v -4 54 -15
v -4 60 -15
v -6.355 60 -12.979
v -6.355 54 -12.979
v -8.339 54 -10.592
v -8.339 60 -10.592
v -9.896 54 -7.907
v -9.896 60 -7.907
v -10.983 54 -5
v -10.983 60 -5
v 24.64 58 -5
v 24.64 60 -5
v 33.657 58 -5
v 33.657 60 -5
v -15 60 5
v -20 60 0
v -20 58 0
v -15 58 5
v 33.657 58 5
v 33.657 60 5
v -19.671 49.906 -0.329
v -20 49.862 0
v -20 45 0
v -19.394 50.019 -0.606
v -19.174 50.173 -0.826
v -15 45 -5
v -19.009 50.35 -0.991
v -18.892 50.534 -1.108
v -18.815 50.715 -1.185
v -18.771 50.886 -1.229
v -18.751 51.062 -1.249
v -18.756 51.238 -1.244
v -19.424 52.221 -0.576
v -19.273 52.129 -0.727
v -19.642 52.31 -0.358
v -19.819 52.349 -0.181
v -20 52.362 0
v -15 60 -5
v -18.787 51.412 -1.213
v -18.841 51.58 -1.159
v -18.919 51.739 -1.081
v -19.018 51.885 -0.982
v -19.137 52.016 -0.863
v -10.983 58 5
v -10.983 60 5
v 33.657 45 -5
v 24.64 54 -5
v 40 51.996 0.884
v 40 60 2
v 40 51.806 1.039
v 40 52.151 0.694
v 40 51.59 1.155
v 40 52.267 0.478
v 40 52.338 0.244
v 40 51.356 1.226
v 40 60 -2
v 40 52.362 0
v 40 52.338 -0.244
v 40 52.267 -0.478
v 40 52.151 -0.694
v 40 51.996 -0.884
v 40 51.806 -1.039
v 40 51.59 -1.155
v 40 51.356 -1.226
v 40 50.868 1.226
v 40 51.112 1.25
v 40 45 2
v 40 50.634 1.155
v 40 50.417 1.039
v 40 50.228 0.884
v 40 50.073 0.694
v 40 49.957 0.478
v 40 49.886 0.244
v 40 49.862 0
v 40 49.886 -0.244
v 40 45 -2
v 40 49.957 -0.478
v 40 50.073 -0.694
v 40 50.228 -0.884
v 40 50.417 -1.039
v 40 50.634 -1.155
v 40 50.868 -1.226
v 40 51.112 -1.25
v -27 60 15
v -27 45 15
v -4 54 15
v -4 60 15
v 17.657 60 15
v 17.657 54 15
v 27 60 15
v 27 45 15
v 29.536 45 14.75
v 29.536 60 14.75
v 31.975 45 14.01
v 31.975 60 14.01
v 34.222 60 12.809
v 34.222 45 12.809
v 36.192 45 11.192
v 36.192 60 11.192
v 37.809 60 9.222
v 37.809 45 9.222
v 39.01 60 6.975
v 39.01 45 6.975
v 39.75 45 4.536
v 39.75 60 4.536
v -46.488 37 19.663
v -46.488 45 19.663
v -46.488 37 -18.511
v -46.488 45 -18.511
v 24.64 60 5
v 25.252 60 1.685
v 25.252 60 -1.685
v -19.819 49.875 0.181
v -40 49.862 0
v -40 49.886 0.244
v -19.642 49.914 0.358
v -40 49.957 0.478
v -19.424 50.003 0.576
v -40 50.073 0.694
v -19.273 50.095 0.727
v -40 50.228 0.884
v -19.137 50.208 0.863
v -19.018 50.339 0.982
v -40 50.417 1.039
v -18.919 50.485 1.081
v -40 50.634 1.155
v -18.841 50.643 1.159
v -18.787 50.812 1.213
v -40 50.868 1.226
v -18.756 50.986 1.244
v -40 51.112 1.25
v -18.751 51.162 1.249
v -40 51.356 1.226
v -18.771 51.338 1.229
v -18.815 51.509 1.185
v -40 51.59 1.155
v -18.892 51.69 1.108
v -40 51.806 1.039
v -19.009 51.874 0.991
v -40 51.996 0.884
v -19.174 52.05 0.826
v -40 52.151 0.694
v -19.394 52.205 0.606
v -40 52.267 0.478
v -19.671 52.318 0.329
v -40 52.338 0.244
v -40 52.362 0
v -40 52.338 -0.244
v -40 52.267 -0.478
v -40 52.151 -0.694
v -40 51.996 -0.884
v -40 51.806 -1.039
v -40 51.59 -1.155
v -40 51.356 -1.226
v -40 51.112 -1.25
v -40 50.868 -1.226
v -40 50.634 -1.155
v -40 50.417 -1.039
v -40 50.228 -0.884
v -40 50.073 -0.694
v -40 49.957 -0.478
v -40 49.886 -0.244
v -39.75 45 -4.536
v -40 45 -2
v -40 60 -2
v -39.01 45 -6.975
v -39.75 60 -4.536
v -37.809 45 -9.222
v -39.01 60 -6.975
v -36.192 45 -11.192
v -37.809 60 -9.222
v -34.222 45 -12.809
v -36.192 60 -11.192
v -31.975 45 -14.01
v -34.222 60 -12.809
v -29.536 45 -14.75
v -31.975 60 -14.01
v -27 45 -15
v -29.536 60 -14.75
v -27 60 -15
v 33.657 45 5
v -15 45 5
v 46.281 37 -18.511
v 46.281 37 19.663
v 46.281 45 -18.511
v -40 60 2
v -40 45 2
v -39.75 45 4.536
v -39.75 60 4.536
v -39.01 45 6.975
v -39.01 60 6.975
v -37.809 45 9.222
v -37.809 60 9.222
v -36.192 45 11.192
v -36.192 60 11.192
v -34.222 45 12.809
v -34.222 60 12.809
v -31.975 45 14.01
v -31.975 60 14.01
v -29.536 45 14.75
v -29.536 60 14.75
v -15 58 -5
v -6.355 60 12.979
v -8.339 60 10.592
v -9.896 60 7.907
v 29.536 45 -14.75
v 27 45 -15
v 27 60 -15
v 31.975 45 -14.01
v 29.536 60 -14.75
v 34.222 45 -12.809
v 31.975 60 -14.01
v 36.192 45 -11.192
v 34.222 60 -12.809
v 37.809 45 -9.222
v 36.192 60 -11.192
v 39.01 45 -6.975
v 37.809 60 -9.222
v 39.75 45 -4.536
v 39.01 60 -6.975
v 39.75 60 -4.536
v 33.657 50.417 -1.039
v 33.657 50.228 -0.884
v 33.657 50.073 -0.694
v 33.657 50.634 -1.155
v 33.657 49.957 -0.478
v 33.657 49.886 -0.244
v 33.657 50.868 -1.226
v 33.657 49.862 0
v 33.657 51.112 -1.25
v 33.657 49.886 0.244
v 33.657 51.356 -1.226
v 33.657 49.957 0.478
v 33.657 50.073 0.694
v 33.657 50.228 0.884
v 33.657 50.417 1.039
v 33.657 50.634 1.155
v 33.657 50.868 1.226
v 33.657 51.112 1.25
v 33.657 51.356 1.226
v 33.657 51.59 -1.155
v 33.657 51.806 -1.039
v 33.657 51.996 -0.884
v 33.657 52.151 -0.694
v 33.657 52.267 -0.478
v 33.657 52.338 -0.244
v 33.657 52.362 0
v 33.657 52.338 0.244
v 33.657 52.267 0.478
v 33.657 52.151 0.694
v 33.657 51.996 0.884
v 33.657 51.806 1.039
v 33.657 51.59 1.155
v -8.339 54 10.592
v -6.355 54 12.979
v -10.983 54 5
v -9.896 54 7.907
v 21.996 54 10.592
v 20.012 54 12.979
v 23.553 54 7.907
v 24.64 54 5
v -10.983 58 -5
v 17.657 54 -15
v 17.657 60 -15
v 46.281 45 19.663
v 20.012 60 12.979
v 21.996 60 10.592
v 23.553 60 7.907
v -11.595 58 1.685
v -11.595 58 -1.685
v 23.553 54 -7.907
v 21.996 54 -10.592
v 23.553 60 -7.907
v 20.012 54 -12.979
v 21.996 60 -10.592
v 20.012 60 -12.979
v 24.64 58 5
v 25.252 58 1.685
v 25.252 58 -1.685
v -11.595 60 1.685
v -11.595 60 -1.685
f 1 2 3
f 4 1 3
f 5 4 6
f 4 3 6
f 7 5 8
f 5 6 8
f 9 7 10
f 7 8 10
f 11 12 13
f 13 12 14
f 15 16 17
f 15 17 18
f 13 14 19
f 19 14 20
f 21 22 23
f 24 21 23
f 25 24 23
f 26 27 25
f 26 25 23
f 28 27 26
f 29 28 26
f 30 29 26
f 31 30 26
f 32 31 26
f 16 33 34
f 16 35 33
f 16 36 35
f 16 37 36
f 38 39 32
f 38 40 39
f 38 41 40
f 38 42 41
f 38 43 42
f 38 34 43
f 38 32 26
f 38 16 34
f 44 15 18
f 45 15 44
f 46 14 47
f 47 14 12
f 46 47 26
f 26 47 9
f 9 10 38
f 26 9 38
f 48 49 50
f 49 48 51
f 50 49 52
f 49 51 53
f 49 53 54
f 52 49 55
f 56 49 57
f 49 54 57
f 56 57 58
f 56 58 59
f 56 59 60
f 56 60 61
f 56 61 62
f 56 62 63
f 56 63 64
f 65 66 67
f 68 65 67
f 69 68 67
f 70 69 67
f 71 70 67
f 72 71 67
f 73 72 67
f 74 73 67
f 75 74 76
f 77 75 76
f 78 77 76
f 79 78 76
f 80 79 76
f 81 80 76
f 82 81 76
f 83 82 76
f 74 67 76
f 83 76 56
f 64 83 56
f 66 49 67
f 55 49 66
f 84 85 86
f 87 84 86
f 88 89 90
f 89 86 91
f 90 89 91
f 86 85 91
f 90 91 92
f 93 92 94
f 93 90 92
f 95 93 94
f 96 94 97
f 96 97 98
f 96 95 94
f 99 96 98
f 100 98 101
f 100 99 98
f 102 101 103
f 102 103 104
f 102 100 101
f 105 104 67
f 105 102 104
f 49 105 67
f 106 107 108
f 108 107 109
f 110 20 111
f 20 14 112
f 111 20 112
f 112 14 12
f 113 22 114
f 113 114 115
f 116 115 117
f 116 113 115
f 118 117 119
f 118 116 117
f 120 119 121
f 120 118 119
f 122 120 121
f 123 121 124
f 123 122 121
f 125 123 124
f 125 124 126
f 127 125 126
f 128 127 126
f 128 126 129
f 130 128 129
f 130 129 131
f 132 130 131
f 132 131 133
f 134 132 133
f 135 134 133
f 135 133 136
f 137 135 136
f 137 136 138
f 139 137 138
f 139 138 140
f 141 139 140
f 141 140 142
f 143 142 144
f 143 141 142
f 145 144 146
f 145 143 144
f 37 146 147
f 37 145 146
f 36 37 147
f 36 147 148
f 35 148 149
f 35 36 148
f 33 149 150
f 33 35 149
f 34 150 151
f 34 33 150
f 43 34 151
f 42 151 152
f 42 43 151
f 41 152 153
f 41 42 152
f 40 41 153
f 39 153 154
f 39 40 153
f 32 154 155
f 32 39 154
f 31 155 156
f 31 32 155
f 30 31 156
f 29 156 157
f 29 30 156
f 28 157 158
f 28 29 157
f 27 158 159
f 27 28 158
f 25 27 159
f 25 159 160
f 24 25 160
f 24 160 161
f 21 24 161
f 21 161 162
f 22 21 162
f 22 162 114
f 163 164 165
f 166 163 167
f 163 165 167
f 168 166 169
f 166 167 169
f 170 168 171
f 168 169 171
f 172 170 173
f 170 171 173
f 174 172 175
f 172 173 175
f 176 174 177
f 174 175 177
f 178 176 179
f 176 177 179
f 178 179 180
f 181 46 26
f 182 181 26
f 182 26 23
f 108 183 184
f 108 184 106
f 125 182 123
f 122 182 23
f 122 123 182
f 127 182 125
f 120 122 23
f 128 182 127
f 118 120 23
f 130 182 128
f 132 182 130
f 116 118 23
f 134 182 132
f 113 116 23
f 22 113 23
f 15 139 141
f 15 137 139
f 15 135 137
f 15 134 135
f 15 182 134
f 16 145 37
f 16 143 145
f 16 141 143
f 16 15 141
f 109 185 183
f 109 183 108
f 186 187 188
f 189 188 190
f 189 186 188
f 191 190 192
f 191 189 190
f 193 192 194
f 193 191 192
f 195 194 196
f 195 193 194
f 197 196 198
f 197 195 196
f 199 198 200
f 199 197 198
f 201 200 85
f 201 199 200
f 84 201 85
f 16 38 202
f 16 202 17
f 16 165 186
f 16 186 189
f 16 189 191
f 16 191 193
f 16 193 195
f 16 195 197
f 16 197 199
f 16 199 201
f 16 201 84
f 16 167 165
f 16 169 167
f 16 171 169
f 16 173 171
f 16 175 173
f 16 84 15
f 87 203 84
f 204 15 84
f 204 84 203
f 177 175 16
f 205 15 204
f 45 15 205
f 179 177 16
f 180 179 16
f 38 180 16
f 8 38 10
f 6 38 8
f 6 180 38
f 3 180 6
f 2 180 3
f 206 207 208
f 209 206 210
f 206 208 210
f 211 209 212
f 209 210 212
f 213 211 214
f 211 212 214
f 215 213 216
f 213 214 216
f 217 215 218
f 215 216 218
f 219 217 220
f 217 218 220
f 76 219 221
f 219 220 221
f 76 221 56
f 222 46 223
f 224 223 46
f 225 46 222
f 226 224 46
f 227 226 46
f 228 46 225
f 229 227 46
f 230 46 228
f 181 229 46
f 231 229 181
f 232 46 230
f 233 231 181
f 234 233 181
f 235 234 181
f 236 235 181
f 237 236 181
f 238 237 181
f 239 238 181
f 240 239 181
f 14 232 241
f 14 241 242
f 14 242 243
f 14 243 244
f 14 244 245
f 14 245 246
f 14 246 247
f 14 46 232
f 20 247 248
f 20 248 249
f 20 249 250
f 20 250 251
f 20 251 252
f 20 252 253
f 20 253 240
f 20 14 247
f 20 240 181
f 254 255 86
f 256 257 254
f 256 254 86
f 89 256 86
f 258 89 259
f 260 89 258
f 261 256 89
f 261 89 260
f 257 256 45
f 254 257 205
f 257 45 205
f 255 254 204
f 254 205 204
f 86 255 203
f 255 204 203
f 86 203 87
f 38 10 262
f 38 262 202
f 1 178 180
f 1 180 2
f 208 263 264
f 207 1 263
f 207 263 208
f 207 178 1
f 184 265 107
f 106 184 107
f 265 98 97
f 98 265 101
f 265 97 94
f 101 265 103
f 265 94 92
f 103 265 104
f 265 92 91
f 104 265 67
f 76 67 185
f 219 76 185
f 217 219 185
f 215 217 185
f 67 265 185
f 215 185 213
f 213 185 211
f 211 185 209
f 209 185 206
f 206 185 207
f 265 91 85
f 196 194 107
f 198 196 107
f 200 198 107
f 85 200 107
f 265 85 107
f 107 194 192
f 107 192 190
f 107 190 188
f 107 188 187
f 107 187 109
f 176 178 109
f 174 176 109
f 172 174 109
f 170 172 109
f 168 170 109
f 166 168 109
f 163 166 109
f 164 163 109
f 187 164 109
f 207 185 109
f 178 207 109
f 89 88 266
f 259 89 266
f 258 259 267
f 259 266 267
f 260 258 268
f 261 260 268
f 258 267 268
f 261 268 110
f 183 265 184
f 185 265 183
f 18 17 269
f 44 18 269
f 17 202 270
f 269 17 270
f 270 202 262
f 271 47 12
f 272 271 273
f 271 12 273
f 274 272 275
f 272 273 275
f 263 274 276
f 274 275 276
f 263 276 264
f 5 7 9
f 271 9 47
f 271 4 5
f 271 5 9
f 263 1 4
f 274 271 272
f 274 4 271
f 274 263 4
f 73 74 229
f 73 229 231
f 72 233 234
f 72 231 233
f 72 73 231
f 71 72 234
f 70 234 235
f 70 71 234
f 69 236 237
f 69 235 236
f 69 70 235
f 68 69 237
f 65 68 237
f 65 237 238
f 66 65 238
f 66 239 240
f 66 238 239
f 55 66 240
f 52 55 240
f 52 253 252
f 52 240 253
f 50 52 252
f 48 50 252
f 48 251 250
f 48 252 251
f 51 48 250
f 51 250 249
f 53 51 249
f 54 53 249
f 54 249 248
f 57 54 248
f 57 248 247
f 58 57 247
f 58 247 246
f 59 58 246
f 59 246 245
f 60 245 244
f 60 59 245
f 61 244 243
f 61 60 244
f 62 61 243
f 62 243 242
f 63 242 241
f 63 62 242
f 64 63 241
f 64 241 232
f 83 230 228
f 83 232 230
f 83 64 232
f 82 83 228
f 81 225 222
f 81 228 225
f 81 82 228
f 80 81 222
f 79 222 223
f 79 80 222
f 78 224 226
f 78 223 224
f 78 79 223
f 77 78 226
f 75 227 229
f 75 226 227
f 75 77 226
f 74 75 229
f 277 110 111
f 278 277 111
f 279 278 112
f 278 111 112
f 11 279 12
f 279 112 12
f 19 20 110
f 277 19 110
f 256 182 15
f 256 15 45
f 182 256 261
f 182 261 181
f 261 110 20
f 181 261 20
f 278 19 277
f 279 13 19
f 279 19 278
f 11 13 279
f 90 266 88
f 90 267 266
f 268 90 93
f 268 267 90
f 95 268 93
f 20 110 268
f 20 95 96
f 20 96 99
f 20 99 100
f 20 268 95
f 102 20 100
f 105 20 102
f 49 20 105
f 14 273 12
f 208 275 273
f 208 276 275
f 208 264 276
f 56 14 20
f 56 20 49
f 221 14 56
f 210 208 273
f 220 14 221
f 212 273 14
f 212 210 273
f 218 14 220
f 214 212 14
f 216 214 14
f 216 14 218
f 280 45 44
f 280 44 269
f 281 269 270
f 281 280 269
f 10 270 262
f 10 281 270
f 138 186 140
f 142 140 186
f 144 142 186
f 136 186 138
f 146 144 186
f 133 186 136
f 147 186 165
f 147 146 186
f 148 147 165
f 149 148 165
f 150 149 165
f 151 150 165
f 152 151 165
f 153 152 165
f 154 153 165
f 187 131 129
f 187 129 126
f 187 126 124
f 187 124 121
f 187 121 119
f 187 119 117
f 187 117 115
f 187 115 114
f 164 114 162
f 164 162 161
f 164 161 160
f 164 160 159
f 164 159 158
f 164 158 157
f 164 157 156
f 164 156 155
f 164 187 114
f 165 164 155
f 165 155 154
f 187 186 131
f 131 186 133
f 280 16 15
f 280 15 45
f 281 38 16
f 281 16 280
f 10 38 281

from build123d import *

# Parameters (mm, degrees)
SKETCH1_W                = 80
SKETCH1_H                = 30
BOSS_EXTRUDE1_DEPTH      = 60
CUT_EXTRUDE1_DEPTH       = 75
CUT_EXTRUDE2_DEPTH       = 102.118742081
CUT_EXTRUDE2_DEPTH_BACK  = 102.118742081
SKETCH3_R                = 1.25
FILLET1_R                = 13
SKETCH15_W               = 83.696095513
SKETCH15_H               = 31.69844841
CUT_EXTRUDE7_DEPTH       = 50
BOSS_EXTRUDE4_DEPTH      = 3
BOSS_EXTRUDE4_DEPTH_BACK = 5
SKETCH16_W               = 92.769089126
SKETCH16_H               = 38.173794917
SKETCH18_R               = 18.5
CUT_EXTRUDE8_DEPTH       = 6
BOSS_EXTRUDE5_DEPTH      = 2
BOSS_EXTRUDE5_2_DEPTH    = 2


with BuildPart() as part:
    # Sketch1 → Boss-Extrude1 (new body)
    with BuildSketch(Plane(origin=(0, 0, 0), x_dir=(1, 0, 0), z_dir=(0, 1, 0))):
        Rectangle(SKETCH1_W, SKETCH1_H)
    extrude(amount=BOSS_EXTRUDE1_DEPTH)

    # Sketch2 → Cut-Extrude1 (cut)
    with BuildSketch(Plane(origin=(0, 60, 0), x_dir=(1, 0, 0), z_dir=(0, 1, 0))):
        Polygon((-15, 5), (15, 5), (33.657016573, 5), (33.657016573, -5), (15, -5), (-15, -5), (-20, 0), align=None)
    extrude(amount=-CUT_EXTRUDE1_DEPTH, mode=Mode.SUBTRACT)

    # Sketch3 → Cut-Extrude2 (cut, two sides: drawn at the far end of the back side and taken through both)
    with BuildSketch(Plane.ZY.offset(40).offset(-CUT_EXTRUDE2_DEPTH_BACK)):
        with Locations(Location((0, 51.111959895, 0), (0, 0, 270))):
            Circle(SKETCH3_R)
    extrude(amount=CUT_EXTRUDE2_DEPTH + CUT_EXTRUDE2_DEPTH_BACK, mode=Mode.SUBTRACT)

    # Fillet1
    fillet1_edges = [part.edges().sort_by_distance(p)[0] for p in [
        (40, 30, 15),
        (-40, 30, 15),
        (-40, 30, -15),
        (40, 30, -15),
    ]]
    fillet(fillet1_edges, radius=FILLET1_R)

    # Sketch15 → Cut-Extrude7 (cut)
    with BuildSketch(Plane(origin=(0, -10, 0), x_dir=(-1, 0, 0), z_dir=(0, -1, 0))):
        with Locations((-0.057440767, 0.030479277)):
            Rectangle(SKETCH15_W, SKETCH15_H)
    extrude(amount=-CUT_EXTRUDE7_DEPTH, mode=Mode.SUBTRACT)

    # Sketch16 → Boss-Extrude4 (add, two sides: drawn at the far end of the back side and taken through both)
    with BuildSketch(Plane(origin=(0, 40, 0), x_dir=(-1, 0, 0), z_dir=(0, -1, 0)).offset(-BOSS_EXTRUDE4_DEPTH_BACK)):
        with Locations((0.103396131, -0.575928298)):
            Rectangle(SKETCH16_W, SKETCH16_H)
    extrude(amount=BOSS_EXTRUDE4_DEPTH + BOSS_EXTRUDE4_DEPTH_BACK)

    # Sketch18 → Cut-Extrude8 (cut)
    with BuildSketch(Plane(origin=(0, 60, 0), x_dir=(1, 0, 0), z_dir=(0, 1, 0))):
        with Locations((6.828508286, 0)):
            Circle(SKETCH18_R)
    extrude(amount=-CUT_EXTRUDE8_DEPTH, mode=Mode.SUBTRACT)


with BuildPart() as body_2:
    # Sketch19 → Boss-Extrude5 (new body)
    with BuildSketch(Plane(origin=(0, 60, 0), x_dir=(1, 0, 0), z_dir=(0, 1, 0))):
        with BuildLine():
            Line((-10.983004844, 5), (-15, 5))
            Line((-15, 5), (-20, 0))
            Line((-20, 0), (-15, -5))
            Line((-15, -5), (-10.983004844, -5))
            ThreePointArc((-10.983004844, -5), (-11.671491714, 0), (-10.983004844, 5))
        make_face()
    extrude(amount=-BOSS_EXTRUDE5_DEPTH)


with BuildPart() as body_3:
    # Sketch19 → Boss-Extrude5 2 (new body)
    with BuildSketch(Plane(origin=(0, 60, 0), x_dir=(1, 0, 0), z_dir=(0, 1, 0))):
        with BuildLine():
            Line((24.640021417, 5), (33.657016573, 5))
            Line((33.657016573, 5), (33.657016573, -5))
            Line((33.657016573, -5), (24.640021417, -5))
            ThreePointArc((24.640021417, -5), (25.328508286, 0), (24.640021417, 5))
        make_face()
    extrude(amount=-BOSS_EXTRUDE5_2_DEPTH)


solid = Compound([part.part, body_2.part, body_3.part])
